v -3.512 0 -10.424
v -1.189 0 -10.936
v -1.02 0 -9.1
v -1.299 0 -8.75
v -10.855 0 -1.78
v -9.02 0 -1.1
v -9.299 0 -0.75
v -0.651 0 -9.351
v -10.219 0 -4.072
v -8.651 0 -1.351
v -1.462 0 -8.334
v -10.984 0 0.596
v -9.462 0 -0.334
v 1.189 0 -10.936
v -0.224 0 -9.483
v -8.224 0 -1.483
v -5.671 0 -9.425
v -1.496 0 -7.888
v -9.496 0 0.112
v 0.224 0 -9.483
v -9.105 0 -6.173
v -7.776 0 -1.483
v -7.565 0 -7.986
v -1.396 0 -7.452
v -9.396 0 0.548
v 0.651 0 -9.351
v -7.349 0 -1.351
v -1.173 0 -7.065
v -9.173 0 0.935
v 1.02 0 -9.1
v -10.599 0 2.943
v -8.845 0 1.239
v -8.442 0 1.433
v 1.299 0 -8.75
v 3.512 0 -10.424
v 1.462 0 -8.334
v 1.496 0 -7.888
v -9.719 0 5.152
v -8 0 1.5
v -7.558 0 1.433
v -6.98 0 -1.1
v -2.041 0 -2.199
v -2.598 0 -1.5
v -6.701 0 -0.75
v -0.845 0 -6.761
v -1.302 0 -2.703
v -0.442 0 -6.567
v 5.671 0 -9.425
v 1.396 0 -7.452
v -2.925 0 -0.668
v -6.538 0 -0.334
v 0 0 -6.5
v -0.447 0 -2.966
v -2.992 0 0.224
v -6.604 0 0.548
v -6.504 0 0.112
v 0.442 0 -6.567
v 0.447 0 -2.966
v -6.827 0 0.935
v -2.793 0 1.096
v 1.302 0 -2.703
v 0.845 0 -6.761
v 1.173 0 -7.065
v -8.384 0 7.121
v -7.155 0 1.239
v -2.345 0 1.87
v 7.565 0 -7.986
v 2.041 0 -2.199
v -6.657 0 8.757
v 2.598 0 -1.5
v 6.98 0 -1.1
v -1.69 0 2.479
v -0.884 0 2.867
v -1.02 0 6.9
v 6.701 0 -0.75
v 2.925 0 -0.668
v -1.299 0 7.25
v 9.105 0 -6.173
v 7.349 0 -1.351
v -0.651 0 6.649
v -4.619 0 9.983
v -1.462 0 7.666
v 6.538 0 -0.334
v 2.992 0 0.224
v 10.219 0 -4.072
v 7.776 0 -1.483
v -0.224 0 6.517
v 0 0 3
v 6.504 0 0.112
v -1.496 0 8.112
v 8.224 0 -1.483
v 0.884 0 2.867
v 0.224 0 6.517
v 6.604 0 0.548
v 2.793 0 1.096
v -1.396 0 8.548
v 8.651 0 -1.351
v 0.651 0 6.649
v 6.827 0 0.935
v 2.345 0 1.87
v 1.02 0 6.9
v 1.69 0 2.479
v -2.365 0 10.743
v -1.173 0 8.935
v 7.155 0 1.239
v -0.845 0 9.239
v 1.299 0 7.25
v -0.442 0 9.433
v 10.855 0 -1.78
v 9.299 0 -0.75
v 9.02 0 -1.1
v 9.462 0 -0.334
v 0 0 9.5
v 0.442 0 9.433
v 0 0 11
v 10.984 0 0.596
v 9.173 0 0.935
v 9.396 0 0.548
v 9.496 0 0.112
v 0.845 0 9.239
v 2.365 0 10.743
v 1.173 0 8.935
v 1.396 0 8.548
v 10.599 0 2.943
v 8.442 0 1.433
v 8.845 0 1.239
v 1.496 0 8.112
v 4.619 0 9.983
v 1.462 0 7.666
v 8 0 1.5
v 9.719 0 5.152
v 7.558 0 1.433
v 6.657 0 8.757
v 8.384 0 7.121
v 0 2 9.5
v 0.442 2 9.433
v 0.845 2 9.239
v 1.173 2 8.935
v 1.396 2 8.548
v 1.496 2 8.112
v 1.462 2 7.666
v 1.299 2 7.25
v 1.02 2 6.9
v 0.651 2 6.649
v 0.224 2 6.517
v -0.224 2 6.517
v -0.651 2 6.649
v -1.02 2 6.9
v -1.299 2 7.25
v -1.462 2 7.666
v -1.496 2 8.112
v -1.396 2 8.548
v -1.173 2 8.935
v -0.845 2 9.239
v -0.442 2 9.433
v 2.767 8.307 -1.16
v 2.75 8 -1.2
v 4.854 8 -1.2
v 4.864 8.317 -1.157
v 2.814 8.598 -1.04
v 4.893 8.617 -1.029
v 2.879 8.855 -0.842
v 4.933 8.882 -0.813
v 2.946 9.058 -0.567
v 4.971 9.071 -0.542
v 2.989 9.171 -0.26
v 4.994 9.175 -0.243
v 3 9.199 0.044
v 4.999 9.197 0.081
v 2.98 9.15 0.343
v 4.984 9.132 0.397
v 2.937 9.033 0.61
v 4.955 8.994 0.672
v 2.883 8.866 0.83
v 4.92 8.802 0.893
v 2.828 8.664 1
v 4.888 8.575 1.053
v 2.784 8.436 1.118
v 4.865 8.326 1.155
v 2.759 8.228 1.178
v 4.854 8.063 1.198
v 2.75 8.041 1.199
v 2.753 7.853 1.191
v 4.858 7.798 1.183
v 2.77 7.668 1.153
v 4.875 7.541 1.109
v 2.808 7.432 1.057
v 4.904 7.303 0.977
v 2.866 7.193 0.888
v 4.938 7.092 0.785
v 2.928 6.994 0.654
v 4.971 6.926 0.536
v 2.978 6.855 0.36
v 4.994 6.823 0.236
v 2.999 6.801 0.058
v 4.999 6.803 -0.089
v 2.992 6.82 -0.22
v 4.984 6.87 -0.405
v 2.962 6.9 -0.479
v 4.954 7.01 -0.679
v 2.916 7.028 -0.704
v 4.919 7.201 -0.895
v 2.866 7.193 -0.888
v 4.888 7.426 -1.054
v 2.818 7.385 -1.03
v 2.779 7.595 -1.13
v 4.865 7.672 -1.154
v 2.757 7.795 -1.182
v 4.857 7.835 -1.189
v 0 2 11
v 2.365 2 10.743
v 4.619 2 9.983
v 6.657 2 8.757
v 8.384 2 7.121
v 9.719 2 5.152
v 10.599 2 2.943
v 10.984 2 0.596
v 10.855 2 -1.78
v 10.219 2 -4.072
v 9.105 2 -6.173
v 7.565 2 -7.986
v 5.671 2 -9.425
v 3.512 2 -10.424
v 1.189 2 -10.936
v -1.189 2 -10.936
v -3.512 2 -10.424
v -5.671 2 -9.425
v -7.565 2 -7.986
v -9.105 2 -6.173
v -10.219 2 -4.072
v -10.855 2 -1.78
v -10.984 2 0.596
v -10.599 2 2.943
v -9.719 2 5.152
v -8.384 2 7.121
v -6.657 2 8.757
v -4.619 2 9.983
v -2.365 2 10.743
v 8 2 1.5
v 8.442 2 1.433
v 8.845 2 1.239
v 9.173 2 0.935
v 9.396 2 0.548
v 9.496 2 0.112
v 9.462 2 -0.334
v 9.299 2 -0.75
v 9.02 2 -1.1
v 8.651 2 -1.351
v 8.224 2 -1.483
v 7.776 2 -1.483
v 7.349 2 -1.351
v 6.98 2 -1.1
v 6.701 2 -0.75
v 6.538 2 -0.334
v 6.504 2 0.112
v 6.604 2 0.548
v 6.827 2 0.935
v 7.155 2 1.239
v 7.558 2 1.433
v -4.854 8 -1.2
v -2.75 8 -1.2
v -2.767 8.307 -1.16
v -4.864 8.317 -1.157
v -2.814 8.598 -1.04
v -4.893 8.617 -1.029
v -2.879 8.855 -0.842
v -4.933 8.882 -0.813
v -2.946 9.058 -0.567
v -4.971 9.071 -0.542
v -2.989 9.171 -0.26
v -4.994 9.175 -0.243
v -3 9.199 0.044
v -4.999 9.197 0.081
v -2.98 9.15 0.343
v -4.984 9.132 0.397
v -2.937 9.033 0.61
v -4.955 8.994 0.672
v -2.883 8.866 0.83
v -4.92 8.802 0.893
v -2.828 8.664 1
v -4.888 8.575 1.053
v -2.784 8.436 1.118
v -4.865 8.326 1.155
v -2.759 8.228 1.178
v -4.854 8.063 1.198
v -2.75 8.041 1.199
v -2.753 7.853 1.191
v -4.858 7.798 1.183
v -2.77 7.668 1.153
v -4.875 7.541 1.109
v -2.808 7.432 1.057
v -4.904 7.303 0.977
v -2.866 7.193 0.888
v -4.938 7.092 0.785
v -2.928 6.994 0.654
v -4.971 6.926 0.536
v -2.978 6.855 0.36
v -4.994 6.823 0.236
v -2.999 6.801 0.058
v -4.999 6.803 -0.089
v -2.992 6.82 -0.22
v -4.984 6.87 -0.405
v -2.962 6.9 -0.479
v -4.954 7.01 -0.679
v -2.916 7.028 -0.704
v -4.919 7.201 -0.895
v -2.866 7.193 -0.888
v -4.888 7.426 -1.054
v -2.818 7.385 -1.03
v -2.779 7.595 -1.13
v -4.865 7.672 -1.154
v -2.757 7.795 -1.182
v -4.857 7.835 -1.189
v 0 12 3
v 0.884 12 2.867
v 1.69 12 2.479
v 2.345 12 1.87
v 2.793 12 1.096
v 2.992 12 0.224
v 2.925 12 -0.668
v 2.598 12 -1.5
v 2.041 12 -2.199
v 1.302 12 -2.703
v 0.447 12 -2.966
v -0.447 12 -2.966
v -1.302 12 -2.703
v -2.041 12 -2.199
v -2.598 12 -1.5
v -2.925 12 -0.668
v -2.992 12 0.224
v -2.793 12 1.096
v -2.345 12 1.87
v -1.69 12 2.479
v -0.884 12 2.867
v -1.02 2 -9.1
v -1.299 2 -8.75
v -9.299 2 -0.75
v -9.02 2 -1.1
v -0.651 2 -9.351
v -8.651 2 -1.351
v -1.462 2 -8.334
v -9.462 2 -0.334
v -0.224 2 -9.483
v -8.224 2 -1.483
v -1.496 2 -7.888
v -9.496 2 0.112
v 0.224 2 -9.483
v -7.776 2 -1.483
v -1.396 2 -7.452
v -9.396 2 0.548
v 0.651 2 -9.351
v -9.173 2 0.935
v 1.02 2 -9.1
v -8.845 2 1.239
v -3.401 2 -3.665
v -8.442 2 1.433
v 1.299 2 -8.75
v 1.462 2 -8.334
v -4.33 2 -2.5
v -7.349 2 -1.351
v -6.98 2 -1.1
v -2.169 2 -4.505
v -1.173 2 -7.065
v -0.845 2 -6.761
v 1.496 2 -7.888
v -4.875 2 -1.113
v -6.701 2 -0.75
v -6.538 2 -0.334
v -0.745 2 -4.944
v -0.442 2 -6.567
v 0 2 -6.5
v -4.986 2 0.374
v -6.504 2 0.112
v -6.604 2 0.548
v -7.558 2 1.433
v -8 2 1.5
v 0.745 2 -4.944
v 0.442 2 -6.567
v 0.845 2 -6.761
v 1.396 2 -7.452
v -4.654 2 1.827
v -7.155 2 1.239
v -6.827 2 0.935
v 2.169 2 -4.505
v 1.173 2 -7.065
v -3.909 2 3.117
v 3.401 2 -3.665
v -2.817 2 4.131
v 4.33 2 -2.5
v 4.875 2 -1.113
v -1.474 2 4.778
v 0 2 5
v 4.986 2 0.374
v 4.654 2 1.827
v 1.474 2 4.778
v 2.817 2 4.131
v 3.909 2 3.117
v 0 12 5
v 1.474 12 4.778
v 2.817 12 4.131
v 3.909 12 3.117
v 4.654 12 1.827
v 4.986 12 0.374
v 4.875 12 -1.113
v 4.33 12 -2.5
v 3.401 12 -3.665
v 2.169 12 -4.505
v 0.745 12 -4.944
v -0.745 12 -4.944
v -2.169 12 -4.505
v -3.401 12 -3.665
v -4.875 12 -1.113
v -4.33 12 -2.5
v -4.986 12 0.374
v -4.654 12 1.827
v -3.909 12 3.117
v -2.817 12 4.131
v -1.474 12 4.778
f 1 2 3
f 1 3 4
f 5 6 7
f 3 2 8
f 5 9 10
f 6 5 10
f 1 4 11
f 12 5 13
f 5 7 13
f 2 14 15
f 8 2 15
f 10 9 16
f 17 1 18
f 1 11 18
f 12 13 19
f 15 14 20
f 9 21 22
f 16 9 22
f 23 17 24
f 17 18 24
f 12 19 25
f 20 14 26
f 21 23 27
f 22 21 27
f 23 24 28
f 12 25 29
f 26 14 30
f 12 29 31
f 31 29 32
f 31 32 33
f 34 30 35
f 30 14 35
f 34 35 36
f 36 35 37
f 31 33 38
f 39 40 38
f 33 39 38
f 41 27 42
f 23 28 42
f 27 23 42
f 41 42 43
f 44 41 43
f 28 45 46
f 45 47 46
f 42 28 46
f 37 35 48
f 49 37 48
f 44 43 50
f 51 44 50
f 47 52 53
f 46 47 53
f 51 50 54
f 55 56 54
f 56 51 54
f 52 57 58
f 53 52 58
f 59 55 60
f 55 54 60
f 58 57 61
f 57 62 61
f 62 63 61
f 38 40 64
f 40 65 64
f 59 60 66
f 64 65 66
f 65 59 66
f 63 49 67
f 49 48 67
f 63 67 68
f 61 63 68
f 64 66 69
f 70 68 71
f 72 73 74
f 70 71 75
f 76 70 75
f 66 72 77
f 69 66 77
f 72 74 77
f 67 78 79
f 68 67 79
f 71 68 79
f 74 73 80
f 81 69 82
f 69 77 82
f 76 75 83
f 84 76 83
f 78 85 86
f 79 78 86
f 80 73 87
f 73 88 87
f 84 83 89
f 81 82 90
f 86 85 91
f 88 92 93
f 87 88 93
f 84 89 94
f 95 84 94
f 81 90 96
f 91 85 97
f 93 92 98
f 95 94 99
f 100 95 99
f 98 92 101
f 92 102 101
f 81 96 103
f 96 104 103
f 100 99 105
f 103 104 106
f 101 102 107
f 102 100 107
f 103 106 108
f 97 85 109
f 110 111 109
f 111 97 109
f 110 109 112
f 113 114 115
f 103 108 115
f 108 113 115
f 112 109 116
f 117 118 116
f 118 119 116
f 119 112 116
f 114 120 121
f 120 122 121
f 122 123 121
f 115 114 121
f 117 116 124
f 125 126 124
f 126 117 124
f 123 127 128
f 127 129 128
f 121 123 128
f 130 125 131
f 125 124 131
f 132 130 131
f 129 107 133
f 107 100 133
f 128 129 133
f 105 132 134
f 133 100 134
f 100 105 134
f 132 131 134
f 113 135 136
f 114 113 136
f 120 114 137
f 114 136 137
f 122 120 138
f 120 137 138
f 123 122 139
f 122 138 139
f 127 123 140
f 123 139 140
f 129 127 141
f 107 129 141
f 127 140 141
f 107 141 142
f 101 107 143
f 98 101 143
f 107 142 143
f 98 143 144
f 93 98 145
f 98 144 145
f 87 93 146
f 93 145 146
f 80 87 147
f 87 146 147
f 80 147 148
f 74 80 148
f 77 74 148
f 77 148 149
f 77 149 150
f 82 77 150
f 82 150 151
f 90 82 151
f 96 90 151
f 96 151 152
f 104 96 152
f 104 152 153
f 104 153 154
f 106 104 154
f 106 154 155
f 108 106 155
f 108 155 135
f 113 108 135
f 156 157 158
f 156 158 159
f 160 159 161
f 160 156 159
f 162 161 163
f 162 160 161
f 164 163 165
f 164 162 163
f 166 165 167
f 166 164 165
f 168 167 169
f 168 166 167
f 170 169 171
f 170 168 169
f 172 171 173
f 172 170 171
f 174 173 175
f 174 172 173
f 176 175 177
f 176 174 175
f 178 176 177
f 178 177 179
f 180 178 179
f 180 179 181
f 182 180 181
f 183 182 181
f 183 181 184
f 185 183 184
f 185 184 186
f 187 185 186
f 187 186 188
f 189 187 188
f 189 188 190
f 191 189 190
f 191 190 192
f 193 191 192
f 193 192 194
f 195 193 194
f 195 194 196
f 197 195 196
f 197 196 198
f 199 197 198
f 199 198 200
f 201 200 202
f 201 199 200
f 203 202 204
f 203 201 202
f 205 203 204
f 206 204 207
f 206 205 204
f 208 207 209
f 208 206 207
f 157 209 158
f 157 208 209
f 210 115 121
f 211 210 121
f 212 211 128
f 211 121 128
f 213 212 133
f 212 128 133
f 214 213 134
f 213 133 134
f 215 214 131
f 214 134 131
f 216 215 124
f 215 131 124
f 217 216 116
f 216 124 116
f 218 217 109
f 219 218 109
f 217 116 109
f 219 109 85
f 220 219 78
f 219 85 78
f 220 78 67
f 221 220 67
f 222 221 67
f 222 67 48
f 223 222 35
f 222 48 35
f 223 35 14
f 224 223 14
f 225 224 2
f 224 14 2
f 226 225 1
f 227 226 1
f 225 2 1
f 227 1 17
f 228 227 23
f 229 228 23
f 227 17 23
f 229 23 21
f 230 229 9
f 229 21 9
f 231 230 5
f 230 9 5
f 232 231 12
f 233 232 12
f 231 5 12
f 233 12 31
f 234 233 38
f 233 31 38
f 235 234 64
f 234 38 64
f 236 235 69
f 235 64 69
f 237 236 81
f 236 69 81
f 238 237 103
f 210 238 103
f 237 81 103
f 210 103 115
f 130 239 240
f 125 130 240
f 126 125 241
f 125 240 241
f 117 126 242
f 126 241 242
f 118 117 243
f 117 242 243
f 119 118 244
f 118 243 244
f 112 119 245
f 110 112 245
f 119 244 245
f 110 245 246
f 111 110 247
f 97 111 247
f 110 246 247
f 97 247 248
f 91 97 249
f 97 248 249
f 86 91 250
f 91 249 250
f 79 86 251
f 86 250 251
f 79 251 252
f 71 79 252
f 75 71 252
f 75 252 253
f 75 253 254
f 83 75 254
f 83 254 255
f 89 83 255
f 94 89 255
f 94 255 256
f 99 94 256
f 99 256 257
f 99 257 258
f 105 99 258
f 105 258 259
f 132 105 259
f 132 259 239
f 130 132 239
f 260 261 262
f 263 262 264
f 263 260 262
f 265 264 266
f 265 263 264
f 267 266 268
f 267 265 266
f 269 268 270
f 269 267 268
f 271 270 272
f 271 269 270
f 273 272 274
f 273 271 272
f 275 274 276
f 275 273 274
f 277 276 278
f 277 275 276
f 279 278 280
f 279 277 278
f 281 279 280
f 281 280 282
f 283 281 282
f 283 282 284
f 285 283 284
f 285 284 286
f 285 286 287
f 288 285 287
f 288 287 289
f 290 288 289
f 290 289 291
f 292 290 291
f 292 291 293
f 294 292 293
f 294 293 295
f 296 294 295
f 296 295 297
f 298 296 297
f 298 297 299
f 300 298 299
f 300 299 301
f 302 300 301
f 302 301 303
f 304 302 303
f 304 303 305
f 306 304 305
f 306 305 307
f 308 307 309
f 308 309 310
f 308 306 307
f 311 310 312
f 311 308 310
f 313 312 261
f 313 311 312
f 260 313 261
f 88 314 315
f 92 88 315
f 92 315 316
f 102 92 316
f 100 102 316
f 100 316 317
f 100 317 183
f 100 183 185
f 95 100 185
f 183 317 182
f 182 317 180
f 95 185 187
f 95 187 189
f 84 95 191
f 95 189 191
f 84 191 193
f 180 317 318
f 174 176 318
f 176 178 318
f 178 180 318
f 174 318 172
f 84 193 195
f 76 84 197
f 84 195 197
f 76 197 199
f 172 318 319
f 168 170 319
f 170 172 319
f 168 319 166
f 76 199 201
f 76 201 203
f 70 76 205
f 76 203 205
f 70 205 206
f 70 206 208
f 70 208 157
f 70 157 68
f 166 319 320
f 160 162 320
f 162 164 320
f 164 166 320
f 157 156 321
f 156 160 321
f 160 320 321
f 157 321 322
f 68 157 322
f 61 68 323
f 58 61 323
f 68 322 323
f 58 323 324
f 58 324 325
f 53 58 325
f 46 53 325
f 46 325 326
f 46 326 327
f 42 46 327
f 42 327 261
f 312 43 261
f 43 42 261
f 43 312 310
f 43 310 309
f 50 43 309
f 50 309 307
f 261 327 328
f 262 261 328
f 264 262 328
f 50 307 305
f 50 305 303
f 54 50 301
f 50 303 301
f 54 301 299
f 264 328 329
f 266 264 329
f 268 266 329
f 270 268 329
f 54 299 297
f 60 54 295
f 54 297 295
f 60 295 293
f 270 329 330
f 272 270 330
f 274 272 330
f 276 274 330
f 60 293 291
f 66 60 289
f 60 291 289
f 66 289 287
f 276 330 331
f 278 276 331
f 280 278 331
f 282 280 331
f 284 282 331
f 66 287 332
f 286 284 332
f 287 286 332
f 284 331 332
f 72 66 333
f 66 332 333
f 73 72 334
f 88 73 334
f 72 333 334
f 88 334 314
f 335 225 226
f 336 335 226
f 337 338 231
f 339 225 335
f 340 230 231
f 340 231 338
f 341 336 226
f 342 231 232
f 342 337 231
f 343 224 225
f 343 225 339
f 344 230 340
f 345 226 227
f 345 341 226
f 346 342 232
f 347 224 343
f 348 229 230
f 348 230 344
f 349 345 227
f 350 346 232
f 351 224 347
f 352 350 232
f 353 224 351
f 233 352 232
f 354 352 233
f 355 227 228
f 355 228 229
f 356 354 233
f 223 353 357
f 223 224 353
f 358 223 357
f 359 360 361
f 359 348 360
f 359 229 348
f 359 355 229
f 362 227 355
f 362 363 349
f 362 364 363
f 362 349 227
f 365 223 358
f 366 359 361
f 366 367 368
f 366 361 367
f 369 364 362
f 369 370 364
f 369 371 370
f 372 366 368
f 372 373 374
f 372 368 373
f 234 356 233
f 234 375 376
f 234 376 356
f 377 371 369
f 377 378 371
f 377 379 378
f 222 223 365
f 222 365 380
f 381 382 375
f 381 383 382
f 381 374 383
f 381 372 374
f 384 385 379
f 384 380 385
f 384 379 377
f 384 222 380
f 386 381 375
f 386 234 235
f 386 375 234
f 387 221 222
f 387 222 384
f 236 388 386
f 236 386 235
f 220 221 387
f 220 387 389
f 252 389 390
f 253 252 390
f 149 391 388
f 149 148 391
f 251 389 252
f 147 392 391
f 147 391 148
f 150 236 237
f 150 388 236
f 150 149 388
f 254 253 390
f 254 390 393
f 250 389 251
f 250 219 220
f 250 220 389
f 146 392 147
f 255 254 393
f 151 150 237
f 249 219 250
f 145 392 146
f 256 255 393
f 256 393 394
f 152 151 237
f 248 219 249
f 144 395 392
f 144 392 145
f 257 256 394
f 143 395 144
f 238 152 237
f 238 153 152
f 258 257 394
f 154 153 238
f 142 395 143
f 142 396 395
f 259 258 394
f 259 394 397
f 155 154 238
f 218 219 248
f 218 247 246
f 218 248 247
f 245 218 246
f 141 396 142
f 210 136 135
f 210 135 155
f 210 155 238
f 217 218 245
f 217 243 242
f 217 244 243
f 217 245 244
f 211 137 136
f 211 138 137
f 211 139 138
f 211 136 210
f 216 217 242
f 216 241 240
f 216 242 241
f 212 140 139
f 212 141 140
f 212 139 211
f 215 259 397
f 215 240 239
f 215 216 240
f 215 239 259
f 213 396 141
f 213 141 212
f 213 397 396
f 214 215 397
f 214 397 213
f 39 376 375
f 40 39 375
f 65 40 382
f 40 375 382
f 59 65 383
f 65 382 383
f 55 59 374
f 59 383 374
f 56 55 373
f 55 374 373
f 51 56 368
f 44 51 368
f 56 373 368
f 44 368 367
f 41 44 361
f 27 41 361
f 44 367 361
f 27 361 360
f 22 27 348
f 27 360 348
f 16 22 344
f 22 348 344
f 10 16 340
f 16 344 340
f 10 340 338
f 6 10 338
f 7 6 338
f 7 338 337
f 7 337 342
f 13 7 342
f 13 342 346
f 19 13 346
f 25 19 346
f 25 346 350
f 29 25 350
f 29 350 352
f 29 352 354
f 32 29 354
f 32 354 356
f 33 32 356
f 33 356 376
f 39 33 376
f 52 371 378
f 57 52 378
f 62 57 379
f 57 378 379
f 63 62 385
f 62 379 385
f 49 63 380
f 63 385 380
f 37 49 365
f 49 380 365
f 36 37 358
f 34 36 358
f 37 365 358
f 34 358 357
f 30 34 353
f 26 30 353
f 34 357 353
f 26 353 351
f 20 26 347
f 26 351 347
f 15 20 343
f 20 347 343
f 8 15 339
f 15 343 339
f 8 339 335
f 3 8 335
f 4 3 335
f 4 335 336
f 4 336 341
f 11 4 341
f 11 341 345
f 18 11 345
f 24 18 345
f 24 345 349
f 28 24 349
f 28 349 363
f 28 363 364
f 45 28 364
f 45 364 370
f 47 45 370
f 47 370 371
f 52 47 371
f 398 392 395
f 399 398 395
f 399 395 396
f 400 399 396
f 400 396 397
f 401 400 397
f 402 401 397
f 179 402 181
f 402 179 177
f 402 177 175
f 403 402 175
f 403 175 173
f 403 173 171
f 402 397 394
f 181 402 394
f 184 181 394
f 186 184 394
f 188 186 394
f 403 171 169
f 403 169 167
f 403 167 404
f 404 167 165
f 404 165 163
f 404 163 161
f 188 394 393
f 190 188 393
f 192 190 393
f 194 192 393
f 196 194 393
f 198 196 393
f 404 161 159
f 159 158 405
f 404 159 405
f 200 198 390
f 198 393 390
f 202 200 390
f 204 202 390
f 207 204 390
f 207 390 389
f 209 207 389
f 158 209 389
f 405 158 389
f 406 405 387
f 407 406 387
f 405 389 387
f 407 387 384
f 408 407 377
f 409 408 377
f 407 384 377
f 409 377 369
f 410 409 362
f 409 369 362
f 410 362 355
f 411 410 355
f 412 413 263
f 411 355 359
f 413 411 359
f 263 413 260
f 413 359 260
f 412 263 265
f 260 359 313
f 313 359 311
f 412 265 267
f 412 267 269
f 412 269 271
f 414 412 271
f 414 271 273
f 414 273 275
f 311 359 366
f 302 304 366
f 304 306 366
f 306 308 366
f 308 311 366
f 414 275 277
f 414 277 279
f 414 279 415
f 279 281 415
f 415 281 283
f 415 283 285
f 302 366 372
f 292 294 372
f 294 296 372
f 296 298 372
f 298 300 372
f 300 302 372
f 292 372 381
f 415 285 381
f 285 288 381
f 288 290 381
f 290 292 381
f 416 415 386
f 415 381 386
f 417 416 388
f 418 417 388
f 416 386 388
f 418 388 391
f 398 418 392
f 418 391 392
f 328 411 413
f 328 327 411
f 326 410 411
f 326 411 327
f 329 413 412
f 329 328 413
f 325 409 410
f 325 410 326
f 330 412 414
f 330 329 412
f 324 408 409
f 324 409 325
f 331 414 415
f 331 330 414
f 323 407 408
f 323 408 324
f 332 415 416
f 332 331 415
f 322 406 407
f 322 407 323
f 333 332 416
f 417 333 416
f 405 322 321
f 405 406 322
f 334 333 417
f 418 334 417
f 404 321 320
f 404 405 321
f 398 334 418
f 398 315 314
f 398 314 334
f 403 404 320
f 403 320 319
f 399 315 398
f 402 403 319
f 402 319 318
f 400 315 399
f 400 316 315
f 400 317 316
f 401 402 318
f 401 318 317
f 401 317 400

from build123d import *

# Parameters (mm, degrees)
SKETCH_1_R               = 11
EXTRUDE_1_DEPTH          = 2
SKETCH_2_R               = 5
EXTRUDE_2_DEPTH          = 10
SKETCH_3_R               = 3
CUT_EXTRUDE_1_DEPTH      = 20.646882704
SKETCH_4_R               = 1.5
CUT_EXTRUDE_2_DEPTH      = 10
CUT_EXTRUDE_3_DEPTH      = 20.646882704
CUT_EXTRUDE_3_DEPTH_BACK = 20.646882704
SKETCH_5_R               = 1.2


with BuildPart() as part:
    # 草图1 → 凸台-拉伸1 (new body)
    with BuildSketch(Plane(origin=(0, 0, 0), x_dir=(1, 0, 0), z_dir=(0, 1, 0))):
        with Locations(Location((0, 0, 0), (0, 0, 270))):
            Circle(SKETCH_1_R)
    extrude(amount=EXTRUDE_1_DEPTH)

    # 草图2 → 凸台-拉伸2 (add)
    with BuildSketch(Plane(origin=(0, 2, 0), x_dir=(1, 0, 0), z_dir=(0, 1, 0))):
        with Locations(Location((0, 0, 0), (0, 0, 270))):
            Circle(SKETCH_2_R)
    extrude(amount=EXTRUDE_2_DEPTH)

    # 草图3 → 切除-拉伸1 (cut, through all)
    with BuildSketch(Plane(origin=(0, 12, 0), x_dir=(1, 0, 0), z_dir=(0, 1, 0))):
        with Locations(Location((0, 0, 0), (0, 0, 270))):
            Circle(SKETCH_3_R)
    extrude(amount=-CUT_EXTRUDE_1_DEPTH, mode=Mode.SUBTRACT)

    # 草图4 → 切除-拉伸2 (cut)
    with BuildSketch(Plane(origin=(0, 2, 0), x_dir=(1, 0, 0), z_dir=(0, 1, 0))):
        with Locations(Location((0, 8, 0), (0, 0, 270))):
            Circle(SKETCH_4_R)
        with Locations(Location((8, 0, 0), (0, 0, 270))):
            Circle(SKETCH_4_R)
        with Locations(Location((0, -8, 0), (0, 0, 270))):
            Circle(SKETCH_4_R)
        with Locations(Location((-8, 0, 0), (0, 0, 270))):
            Circle(SKETCH_4_R)
    extrude(amount=-CUT_EXTRUDE_2_DEPTH, mode=Mode.SUBTRACT)

    # 草图5 → 切除-拉伸3 (cut, two sides: drawn at the far end of the back side and taken through both)
    with BuildSketch(Plane(origin=(0, 0, 0), x_dir=(0, 0, -1), z_dir=(1, 0, 0)).offset(-CUT_EXTRUDE_3_DEPTH_BACK)):
        with Locations((0, 8)):
            Circle(SKETCH_5_R)
    extrude(amount=CUT_EXTRUDE_3_DEPTH + CUT_EXTRUDE_3_DEPTH_BACK, mode=Mode.SUBTRACT)


solid = part.part
